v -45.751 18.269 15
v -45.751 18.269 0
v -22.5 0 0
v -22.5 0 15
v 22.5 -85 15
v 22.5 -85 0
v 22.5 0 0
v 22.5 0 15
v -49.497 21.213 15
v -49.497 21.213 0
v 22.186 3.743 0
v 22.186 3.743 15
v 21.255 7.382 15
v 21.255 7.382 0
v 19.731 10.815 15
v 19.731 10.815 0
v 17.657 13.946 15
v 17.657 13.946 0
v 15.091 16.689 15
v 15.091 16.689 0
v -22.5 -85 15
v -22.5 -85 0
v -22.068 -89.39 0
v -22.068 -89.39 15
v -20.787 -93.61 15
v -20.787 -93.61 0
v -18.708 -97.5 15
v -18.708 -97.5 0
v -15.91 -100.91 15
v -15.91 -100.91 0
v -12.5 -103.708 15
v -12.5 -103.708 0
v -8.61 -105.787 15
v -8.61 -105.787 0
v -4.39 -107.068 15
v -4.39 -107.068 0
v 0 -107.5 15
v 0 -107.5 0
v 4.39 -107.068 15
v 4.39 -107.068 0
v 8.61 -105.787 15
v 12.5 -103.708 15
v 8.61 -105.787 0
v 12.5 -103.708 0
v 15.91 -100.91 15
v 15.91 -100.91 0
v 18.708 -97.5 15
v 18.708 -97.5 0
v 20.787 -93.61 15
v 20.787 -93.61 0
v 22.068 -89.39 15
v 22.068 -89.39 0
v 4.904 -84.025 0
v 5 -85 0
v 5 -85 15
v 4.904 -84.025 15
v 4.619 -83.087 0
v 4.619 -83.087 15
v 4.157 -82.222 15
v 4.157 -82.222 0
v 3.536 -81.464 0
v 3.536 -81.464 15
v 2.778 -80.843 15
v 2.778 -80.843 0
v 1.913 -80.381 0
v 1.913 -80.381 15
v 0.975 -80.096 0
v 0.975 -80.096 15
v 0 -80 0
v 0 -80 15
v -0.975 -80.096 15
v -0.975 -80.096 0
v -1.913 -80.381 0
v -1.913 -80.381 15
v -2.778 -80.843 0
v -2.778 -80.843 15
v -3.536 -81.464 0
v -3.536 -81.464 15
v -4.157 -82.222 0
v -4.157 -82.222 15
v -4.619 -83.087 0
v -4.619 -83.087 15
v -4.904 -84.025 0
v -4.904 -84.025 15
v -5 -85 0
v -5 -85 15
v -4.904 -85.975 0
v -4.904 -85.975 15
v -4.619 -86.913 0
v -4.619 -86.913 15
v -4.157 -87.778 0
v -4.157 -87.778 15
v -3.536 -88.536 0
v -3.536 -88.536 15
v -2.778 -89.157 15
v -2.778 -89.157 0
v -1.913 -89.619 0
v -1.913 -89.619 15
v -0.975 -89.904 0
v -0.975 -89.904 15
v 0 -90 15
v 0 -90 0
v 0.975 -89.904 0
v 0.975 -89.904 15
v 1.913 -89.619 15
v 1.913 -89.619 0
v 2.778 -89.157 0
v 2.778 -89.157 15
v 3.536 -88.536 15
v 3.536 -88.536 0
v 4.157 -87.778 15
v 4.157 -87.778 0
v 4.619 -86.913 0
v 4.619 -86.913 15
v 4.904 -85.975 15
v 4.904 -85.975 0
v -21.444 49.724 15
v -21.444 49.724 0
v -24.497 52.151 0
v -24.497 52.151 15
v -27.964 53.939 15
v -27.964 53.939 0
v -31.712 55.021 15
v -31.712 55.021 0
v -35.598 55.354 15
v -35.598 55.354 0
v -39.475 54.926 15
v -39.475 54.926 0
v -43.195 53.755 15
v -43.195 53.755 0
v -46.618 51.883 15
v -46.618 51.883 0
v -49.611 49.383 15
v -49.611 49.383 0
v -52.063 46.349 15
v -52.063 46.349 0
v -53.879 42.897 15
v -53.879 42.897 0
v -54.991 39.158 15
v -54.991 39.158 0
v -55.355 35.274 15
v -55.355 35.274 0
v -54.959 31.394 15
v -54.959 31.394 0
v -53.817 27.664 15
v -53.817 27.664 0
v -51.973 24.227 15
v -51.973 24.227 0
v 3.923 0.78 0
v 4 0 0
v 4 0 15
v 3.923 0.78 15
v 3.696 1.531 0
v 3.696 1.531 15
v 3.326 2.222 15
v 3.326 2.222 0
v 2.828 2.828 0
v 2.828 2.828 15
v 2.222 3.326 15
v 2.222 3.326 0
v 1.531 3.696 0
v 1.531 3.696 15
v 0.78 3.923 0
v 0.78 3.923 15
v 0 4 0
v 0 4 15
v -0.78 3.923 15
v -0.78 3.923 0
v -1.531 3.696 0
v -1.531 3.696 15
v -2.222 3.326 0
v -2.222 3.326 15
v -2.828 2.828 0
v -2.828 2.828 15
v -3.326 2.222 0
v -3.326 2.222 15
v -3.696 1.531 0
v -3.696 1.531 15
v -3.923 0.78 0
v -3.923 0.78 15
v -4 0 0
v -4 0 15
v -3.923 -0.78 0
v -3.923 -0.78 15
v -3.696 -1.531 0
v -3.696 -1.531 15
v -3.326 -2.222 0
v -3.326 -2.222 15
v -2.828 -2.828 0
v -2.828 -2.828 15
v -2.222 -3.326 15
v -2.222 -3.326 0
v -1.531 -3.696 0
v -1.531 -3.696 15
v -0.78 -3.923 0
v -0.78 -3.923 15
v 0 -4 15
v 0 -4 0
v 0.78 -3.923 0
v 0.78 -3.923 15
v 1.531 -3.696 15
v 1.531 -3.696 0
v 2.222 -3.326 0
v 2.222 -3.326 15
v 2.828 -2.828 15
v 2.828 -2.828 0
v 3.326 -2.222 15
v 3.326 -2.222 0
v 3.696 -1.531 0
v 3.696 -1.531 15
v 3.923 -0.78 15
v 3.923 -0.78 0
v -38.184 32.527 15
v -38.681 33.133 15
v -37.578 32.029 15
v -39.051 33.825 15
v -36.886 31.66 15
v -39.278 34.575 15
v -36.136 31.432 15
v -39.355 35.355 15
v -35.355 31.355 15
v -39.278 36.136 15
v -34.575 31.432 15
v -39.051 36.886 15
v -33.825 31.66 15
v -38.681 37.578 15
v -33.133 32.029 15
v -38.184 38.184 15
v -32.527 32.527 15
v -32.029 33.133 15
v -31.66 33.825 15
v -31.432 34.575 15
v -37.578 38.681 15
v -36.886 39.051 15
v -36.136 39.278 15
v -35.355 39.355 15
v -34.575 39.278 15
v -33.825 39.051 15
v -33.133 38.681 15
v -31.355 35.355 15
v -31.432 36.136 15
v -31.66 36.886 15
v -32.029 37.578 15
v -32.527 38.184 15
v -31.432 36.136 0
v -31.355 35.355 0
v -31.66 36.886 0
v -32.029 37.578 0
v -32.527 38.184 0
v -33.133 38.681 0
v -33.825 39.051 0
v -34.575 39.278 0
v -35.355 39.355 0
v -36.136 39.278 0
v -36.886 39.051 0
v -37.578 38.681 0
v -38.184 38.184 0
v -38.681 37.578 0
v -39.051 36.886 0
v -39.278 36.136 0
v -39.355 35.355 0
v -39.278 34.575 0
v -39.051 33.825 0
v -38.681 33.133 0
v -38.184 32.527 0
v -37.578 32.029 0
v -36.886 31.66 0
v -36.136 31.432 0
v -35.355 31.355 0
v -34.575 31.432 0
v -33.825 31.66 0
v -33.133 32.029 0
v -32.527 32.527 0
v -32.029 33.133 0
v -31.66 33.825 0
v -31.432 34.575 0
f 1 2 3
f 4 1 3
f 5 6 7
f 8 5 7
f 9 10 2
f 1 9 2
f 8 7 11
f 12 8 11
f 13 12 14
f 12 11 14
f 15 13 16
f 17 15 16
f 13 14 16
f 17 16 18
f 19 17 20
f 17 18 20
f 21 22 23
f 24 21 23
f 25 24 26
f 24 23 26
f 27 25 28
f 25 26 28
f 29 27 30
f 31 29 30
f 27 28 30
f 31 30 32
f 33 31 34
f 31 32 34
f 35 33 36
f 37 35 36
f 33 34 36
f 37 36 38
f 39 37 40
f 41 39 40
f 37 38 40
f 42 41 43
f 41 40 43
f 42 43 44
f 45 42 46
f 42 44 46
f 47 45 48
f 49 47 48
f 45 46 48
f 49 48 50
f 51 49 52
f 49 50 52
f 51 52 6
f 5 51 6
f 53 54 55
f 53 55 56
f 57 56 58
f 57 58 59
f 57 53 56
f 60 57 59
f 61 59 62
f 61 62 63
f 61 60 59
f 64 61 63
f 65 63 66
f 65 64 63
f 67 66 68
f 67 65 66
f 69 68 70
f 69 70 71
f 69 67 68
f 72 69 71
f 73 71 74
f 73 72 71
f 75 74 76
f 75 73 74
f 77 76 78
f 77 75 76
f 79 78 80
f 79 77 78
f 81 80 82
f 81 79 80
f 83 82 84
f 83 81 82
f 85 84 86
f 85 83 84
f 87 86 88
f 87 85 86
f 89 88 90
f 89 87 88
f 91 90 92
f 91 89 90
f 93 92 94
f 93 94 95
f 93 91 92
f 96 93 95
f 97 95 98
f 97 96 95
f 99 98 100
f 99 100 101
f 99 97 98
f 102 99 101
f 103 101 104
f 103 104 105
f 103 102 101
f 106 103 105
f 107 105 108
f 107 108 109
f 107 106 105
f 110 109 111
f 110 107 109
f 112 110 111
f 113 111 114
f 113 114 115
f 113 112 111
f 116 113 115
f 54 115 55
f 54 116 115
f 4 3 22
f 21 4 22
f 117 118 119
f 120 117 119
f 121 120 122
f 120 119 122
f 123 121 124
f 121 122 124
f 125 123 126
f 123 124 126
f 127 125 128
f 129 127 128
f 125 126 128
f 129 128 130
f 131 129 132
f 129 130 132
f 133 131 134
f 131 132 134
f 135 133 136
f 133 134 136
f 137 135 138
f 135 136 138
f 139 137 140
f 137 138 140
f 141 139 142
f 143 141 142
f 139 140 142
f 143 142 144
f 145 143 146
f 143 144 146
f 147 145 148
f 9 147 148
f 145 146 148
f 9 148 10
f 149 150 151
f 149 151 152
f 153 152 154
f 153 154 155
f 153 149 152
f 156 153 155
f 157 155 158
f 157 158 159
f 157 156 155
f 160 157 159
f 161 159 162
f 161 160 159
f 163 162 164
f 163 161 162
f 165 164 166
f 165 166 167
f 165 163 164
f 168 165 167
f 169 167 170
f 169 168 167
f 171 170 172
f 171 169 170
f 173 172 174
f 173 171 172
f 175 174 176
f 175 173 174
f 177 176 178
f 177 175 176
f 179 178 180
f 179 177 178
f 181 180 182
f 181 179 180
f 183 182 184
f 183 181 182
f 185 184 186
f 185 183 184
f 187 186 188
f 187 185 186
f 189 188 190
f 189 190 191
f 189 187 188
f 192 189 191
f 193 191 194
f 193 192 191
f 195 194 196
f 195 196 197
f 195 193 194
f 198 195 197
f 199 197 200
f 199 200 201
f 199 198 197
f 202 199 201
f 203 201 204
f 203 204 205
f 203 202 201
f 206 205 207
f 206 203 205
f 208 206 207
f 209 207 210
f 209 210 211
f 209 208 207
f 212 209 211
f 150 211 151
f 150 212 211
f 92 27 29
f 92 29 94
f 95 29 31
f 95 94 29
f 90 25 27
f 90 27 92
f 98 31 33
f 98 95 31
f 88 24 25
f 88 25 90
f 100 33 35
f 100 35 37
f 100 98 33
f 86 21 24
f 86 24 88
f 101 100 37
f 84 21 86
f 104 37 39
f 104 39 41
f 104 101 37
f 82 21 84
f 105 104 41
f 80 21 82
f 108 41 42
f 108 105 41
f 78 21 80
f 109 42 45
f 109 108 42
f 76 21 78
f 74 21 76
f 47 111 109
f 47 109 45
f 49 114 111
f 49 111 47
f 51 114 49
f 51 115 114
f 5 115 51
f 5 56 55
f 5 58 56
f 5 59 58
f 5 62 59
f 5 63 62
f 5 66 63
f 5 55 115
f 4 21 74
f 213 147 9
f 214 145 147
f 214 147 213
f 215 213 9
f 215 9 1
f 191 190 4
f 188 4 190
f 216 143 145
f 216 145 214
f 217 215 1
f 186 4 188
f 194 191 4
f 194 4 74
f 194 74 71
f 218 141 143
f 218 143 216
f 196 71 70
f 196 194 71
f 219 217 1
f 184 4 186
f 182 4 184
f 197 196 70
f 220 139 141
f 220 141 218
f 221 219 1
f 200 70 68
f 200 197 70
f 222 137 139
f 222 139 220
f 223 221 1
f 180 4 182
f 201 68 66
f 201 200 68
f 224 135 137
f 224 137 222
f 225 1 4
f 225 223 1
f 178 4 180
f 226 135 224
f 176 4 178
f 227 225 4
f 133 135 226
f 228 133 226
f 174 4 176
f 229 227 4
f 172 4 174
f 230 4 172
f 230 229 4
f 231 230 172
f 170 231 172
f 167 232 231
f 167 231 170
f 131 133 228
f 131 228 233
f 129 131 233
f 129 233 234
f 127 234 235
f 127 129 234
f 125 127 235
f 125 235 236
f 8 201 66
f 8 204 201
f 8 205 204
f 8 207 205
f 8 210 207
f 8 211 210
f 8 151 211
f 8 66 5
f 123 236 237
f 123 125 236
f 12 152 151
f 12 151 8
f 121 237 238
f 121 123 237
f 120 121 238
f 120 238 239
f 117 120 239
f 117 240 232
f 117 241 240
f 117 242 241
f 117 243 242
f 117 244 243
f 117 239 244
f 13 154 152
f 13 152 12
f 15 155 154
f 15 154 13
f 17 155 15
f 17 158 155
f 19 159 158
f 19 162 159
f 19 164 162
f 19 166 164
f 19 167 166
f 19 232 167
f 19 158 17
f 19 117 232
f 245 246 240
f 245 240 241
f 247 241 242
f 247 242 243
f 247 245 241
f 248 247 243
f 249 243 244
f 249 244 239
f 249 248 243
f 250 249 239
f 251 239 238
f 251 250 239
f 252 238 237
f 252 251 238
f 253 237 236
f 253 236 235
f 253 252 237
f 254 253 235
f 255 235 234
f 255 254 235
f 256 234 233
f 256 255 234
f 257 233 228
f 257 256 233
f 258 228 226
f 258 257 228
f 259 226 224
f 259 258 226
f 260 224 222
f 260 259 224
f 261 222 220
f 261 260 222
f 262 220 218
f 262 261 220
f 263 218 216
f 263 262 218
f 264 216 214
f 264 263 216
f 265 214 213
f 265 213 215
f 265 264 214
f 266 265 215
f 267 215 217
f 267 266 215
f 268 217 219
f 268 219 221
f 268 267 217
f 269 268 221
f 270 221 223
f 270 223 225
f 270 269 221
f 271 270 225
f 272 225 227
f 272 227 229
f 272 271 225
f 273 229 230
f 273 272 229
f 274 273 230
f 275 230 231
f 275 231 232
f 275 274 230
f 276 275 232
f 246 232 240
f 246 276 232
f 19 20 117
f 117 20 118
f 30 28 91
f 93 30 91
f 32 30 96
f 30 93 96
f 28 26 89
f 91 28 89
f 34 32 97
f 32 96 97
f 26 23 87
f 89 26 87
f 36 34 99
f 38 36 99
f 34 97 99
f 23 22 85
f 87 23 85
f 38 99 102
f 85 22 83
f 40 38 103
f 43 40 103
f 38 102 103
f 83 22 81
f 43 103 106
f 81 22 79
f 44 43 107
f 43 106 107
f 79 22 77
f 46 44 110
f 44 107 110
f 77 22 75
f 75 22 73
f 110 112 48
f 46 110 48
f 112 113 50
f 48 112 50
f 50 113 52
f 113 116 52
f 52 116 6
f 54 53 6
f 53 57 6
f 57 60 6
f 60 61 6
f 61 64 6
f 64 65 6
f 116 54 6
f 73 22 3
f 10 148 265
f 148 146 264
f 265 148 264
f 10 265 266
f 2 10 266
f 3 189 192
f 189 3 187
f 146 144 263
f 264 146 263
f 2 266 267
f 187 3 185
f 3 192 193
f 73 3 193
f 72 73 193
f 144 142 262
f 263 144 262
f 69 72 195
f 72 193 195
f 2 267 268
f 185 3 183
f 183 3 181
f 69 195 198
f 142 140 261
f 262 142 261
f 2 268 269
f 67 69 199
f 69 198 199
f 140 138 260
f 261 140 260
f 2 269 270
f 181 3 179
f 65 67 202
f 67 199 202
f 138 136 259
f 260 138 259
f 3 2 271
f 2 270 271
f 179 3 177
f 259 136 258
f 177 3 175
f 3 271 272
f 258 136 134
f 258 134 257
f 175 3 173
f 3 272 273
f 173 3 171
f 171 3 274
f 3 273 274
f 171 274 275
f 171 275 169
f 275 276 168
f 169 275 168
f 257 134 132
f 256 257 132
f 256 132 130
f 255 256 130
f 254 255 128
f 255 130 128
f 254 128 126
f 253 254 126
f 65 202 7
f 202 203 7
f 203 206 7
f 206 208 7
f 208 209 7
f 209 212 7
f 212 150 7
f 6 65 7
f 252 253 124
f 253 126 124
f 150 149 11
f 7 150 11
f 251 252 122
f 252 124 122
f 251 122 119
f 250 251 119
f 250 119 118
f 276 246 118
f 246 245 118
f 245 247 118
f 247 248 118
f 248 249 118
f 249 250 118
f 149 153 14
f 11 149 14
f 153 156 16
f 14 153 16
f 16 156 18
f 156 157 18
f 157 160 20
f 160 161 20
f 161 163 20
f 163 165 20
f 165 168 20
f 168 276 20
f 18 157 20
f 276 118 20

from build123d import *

# Parameters (mm, degrees)
F0_R     = 5
F0_R_2   = 4
F1_DEPTH = 15


with BuildPart() as f1:
    # F0 (on Top) → F1 (new body)
    with BuildSketch(Plane.XY):
        with BuildLine():
            Line((15.090626, 16.689009), (-21.443711, 49.724285))
            ThreePointArc((-21.443711, 49.724285), (-49.611346, 49.382679), (-49.497475, 21.213203))
            Line((-49.497475, 21.213203), (-45.750738, 18.269213))
            Line((-45.750738, 18.269213), (-22.5, 0))
            Line((-22.5, 0), (-22.5, -85))
            ThreePointArc((-22.5, -85), (0, -107.5), (22.5, -85))
            Line((22.5, -85), (22.5, 0))
            ThreePointArc((22.5, 0), (20.5644, 9.129921), (15.090626, 16.689009))
        make_face()
        with Locations((0, -85)):
            Circle(F0_R, mode=Mode.SUBTRACT)
        with Locations((-35.355339, 35.355339)):
            Circle(F0_R_2, mode=Mode.SUBTRACT)
        Circle(F0_R_2, mode=Mode.SUBTRACT)
    extrude(amount=F1_DEPTH)


solid = f1.part
